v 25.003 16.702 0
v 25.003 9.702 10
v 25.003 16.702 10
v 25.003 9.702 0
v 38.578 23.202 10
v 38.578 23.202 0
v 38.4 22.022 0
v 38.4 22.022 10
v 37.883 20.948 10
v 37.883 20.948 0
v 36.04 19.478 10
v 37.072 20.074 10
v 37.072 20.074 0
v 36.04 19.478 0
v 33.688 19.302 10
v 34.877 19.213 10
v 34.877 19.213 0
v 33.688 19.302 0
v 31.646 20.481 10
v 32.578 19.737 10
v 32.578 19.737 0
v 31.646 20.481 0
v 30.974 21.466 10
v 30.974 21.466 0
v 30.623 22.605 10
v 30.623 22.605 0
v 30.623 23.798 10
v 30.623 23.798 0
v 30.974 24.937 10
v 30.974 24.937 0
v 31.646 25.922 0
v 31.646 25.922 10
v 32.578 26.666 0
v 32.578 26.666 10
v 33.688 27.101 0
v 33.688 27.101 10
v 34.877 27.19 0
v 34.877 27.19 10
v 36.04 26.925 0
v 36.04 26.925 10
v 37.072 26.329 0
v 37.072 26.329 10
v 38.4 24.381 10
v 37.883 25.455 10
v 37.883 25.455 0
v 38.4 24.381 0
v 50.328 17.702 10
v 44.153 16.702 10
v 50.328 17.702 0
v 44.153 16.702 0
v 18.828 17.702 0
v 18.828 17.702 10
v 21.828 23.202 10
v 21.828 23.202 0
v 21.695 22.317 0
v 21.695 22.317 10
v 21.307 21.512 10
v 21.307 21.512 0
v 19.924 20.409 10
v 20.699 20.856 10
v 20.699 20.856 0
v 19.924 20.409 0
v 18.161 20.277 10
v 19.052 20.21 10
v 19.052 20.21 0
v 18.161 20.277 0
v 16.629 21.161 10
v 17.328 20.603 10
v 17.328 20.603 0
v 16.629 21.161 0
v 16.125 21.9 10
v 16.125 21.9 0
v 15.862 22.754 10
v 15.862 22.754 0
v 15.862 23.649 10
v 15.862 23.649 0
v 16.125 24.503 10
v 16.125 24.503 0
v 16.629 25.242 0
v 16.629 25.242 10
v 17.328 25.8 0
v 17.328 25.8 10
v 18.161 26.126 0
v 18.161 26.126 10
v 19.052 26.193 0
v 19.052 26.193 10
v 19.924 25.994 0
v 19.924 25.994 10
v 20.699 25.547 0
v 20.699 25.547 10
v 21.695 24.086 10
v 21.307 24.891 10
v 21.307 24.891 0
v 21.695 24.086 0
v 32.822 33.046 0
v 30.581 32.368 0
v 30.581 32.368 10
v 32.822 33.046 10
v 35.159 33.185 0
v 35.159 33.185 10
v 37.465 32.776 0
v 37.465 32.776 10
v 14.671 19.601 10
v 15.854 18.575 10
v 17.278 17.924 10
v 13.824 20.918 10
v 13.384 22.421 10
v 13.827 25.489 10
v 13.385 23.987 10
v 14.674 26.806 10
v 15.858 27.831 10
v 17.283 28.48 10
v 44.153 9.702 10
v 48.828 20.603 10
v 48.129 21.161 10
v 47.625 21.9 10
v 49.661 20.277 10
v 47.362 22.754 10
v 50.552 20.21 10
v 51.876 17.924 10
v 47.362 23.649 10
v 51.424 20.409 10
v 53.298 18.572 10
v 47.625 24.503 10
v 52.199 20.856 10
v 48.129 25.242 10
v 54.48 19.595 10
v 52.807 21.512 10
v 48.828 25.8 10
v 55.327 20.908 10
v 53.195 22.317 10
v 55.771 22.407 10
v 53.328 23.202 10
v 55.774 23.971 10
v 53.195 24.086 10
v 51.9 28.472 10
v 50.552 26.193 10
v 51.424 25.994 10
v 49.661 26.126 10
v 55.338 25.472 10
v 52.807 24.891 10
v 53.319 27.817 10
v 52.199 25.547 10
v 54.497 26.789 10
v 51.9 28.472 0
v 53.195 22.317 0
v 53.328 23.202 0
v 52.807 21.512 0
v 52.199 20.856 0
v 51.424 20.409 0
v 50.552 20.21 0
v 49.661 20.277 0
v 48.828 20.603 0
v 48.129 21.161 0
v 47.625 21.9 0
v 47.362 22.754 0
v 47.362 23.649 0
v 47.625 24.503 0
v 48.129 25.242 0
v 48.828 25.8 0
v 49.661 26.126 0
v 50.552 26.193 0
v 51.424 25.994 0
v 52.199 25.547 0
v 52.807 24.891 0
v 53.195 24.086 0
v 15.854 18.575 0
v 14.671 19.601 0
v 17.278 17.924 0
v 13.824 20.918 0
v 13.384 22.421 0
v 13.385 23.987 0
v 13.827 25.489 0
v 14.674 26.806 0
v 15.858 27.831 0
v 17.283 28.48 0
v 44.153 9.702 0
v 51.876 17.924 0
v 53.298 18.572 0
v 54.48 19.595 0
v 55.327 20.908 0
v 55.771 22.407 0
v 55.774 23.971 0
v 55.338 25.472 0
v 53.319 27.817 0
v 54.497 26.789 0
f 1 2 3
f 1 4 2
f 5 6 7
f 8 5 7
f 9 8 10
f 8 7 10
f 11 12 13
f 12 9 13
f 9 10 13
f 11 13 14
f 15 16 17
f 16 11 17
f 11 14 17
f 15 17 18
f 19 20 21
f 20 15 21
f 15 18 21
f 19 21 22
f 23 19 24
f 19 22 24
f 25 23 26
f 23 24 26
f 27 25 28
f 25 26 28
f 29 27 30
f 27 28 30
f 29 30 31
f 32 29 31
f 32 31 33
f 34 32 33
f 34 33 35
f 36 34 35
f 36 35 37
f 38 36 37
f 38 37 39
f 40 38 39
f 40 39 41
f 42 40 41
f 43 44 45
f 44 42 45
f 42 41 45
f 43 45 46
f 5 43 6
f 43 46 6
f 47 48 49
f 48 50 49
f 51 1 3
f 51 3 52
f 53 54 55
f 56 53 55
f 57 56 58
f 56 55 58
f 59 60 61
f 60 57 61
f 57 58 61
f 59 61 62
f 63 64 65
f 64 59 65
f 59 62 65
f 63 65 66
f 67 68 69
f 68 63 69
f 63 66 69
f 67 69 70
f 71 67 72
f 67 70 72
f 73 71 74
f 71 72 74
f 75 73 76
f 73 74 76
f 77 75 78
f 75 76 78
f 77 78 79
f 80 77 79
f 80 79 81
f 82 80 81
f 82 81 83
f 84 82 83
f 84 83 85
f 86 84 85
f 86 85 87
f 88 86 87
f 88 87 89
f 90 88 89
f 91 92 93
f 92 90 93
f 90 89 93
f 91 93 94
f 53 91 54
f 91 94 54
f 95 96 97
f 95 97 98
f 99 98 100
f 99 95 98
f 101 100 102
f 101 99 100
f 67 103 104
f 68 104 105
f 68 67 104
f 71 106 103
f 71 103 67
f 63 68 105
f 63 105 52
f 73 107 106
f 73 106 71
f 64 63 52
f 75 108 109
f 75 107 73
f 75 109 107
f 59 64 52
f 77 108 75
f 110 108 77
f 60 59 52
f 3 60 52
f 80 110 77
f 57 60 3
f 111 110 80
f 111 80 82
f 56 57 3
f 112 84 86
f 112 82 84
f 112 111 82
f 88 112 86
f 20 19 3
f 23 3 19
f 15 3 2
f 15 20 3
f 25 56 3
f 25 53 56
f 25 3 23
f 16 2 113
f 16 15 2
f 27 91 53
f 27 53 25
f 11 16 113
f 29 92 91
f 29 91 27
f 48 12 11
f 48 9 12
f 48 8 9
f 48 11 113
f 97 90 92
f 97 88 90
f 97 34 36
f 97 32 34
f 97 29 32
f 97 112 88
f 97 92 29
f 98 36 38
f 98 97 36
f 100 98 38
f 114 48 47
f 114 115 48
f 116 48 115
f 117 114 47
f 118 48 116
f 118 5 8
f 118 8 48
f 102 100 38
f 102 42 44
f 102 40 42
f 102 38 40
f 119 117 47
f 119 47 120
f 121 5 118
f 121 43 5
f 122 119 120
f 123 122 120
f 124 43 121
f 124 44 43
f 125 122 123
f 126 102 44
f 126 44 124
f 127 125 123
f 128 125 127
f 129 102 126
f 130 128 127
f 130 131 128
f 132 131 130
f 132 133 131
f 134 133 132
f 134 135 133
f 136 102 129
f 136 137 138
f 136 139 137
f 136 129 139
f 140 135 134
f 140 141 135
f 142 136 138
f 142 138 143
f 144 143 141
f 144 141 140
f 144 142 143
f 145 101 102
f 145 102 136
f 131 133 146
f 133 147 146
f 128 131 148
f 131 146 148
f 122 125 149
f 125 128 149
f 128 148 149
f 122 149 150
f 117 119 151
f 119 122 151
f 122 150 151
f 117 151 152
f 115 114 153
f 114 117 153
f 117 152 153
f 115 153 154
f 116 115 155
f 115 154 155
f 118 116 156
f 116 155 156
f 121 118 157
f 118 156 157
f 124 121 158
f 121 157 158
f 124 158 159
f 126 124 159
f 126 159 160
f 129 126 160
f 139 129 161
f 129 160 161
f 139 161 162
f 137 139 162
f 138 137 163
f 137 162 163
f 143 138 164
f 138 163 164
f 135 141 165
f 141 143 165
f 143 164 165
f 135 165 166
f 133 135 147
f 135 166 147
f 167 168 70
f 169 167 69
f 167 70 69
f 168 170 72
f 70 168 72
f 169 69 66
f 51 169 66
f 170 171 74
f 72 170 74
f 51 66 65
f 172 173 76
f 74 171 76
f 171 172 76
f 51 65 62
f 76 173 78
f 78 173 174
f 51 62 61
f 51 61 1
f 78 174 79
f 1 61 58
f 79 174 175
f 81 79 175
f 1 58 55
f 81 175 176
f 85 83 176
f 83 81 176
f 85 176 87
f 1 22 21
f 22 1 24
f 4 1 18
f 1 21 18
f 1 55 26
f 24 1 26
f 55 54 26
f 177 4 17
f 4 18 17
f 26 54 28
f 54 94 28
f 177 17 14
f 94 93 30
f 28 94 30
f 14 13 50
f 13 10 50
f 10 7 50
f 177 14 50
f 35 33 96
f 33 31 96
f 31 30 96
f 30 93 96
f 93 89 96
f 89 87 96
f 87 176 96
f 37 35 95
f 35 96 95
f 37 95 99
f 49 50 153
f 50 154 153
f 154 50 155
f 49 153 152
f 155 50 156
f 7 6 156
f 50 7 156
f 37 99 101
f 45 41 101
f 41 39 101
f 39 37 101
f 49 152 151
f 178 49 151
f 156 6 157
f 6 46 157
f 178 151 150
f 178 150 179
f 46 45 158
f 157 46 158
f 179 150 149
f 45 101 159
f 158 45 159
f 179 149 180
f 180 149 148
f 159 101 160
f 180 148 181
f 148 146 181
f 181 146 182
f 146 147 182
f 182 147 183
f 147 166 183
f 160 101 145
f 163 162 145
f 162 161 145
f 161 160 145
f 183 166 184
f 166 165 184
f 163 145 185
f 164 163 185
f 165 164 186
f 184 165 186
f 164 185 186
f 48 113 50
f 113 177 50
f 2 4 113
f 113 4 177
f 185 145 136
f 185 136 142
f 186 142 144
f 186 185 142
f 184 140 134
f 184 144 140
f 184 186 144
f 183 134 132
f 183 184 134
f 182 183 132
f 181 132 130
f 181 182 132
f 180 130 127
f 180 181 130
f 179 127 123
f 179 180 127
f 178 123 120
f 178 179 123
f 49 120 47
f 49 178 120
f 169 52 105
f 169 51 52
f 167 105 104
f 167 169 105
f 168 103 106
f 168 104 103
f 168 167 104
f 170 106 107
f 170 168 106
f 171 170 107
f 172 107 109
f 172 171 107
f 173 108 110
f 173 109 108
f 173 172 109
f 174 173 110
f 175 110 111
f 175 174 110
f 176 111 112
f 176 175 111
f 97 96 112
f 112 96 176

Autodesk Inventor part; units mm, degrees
ref_plane "YZ Plane" through (0, 0, 0) normal (1, 0, 0) x (0, 1, 0)
ref_plane "XZ Plane" through (0, 0, 0) normal (0, 1, 0) x (-1, 0, 0)
ref_plane "XY Plane" through (0, 0, 0) normal (0, 0, 1) x (1, 0, 0)
sketch "Sketch1" plane through (0, 0, 0) normal (0, 0, 1) x (1, 0, 0)
  circle A0 centre (50.3282, 23.2015) radius 3
  circle A1 centre (18.8282, 23.2015) radius 3
  circle A2 centre (34.5782, 23.2015) radius 4
  arc A3 (37.4648, 32.7758) -> (30.5806, 32.3677) centre (34.5782, 23.2015) ccw
  arc A4 (50.3282, 17.7015) -> (51.8996, 28.4722) centre (50.3282, 23.2015) ccw
  line L0 (37.4648, 32.7758) -> (51.8996, 28.4722)
  line L1 (34.3282, 9.7015) -> (44.1532, 9.7015)
  line L2 (44.1532, 9.7015) -> (44.1532, 16.7015)
  line L3 (44.1532, 16.7015) -> (50.3282, 17.7015)
  line L4 (30.5806, 32.3677) -> (17.2831, 28.48)
  line L5 (34.3282, 9.7015) -> (25.0032, 9.7015)
  line L6 (25.0032, 9.7015) -> (25.0032, 16.7015)
  line L7 (25.0032, 16.7015) -> (18.8282, 17.7015)
  arc A5 (17.2831, 28.48) -> (18.8282, 17.7015) centre (18.8282, 23.2015) ccw
  circle A6 centre (34.5782, 23.2015) radius 8.7313
  point P0 (0, 0)
  dimension "d0" = 31.5
  dimension "d1" = 6
  dimension "d2" = 8
  dimension "d3" = 15.75
  dimension "d4" = 20
  dimension "d5" = 11
  dimension "d7" = 9.825
  dimension "d8" = 7
  dimension "d9" = 11
  dimension "d12" = 17.4625
  dimension "d14" = 0
extrude "Extrusion1" add sketch "Sketch1" along normal blind 10 contours L0 A4 L3 L2 L1 L5 L6 L7 A5 L4 A3 | A6
properties part number "shaft support"
